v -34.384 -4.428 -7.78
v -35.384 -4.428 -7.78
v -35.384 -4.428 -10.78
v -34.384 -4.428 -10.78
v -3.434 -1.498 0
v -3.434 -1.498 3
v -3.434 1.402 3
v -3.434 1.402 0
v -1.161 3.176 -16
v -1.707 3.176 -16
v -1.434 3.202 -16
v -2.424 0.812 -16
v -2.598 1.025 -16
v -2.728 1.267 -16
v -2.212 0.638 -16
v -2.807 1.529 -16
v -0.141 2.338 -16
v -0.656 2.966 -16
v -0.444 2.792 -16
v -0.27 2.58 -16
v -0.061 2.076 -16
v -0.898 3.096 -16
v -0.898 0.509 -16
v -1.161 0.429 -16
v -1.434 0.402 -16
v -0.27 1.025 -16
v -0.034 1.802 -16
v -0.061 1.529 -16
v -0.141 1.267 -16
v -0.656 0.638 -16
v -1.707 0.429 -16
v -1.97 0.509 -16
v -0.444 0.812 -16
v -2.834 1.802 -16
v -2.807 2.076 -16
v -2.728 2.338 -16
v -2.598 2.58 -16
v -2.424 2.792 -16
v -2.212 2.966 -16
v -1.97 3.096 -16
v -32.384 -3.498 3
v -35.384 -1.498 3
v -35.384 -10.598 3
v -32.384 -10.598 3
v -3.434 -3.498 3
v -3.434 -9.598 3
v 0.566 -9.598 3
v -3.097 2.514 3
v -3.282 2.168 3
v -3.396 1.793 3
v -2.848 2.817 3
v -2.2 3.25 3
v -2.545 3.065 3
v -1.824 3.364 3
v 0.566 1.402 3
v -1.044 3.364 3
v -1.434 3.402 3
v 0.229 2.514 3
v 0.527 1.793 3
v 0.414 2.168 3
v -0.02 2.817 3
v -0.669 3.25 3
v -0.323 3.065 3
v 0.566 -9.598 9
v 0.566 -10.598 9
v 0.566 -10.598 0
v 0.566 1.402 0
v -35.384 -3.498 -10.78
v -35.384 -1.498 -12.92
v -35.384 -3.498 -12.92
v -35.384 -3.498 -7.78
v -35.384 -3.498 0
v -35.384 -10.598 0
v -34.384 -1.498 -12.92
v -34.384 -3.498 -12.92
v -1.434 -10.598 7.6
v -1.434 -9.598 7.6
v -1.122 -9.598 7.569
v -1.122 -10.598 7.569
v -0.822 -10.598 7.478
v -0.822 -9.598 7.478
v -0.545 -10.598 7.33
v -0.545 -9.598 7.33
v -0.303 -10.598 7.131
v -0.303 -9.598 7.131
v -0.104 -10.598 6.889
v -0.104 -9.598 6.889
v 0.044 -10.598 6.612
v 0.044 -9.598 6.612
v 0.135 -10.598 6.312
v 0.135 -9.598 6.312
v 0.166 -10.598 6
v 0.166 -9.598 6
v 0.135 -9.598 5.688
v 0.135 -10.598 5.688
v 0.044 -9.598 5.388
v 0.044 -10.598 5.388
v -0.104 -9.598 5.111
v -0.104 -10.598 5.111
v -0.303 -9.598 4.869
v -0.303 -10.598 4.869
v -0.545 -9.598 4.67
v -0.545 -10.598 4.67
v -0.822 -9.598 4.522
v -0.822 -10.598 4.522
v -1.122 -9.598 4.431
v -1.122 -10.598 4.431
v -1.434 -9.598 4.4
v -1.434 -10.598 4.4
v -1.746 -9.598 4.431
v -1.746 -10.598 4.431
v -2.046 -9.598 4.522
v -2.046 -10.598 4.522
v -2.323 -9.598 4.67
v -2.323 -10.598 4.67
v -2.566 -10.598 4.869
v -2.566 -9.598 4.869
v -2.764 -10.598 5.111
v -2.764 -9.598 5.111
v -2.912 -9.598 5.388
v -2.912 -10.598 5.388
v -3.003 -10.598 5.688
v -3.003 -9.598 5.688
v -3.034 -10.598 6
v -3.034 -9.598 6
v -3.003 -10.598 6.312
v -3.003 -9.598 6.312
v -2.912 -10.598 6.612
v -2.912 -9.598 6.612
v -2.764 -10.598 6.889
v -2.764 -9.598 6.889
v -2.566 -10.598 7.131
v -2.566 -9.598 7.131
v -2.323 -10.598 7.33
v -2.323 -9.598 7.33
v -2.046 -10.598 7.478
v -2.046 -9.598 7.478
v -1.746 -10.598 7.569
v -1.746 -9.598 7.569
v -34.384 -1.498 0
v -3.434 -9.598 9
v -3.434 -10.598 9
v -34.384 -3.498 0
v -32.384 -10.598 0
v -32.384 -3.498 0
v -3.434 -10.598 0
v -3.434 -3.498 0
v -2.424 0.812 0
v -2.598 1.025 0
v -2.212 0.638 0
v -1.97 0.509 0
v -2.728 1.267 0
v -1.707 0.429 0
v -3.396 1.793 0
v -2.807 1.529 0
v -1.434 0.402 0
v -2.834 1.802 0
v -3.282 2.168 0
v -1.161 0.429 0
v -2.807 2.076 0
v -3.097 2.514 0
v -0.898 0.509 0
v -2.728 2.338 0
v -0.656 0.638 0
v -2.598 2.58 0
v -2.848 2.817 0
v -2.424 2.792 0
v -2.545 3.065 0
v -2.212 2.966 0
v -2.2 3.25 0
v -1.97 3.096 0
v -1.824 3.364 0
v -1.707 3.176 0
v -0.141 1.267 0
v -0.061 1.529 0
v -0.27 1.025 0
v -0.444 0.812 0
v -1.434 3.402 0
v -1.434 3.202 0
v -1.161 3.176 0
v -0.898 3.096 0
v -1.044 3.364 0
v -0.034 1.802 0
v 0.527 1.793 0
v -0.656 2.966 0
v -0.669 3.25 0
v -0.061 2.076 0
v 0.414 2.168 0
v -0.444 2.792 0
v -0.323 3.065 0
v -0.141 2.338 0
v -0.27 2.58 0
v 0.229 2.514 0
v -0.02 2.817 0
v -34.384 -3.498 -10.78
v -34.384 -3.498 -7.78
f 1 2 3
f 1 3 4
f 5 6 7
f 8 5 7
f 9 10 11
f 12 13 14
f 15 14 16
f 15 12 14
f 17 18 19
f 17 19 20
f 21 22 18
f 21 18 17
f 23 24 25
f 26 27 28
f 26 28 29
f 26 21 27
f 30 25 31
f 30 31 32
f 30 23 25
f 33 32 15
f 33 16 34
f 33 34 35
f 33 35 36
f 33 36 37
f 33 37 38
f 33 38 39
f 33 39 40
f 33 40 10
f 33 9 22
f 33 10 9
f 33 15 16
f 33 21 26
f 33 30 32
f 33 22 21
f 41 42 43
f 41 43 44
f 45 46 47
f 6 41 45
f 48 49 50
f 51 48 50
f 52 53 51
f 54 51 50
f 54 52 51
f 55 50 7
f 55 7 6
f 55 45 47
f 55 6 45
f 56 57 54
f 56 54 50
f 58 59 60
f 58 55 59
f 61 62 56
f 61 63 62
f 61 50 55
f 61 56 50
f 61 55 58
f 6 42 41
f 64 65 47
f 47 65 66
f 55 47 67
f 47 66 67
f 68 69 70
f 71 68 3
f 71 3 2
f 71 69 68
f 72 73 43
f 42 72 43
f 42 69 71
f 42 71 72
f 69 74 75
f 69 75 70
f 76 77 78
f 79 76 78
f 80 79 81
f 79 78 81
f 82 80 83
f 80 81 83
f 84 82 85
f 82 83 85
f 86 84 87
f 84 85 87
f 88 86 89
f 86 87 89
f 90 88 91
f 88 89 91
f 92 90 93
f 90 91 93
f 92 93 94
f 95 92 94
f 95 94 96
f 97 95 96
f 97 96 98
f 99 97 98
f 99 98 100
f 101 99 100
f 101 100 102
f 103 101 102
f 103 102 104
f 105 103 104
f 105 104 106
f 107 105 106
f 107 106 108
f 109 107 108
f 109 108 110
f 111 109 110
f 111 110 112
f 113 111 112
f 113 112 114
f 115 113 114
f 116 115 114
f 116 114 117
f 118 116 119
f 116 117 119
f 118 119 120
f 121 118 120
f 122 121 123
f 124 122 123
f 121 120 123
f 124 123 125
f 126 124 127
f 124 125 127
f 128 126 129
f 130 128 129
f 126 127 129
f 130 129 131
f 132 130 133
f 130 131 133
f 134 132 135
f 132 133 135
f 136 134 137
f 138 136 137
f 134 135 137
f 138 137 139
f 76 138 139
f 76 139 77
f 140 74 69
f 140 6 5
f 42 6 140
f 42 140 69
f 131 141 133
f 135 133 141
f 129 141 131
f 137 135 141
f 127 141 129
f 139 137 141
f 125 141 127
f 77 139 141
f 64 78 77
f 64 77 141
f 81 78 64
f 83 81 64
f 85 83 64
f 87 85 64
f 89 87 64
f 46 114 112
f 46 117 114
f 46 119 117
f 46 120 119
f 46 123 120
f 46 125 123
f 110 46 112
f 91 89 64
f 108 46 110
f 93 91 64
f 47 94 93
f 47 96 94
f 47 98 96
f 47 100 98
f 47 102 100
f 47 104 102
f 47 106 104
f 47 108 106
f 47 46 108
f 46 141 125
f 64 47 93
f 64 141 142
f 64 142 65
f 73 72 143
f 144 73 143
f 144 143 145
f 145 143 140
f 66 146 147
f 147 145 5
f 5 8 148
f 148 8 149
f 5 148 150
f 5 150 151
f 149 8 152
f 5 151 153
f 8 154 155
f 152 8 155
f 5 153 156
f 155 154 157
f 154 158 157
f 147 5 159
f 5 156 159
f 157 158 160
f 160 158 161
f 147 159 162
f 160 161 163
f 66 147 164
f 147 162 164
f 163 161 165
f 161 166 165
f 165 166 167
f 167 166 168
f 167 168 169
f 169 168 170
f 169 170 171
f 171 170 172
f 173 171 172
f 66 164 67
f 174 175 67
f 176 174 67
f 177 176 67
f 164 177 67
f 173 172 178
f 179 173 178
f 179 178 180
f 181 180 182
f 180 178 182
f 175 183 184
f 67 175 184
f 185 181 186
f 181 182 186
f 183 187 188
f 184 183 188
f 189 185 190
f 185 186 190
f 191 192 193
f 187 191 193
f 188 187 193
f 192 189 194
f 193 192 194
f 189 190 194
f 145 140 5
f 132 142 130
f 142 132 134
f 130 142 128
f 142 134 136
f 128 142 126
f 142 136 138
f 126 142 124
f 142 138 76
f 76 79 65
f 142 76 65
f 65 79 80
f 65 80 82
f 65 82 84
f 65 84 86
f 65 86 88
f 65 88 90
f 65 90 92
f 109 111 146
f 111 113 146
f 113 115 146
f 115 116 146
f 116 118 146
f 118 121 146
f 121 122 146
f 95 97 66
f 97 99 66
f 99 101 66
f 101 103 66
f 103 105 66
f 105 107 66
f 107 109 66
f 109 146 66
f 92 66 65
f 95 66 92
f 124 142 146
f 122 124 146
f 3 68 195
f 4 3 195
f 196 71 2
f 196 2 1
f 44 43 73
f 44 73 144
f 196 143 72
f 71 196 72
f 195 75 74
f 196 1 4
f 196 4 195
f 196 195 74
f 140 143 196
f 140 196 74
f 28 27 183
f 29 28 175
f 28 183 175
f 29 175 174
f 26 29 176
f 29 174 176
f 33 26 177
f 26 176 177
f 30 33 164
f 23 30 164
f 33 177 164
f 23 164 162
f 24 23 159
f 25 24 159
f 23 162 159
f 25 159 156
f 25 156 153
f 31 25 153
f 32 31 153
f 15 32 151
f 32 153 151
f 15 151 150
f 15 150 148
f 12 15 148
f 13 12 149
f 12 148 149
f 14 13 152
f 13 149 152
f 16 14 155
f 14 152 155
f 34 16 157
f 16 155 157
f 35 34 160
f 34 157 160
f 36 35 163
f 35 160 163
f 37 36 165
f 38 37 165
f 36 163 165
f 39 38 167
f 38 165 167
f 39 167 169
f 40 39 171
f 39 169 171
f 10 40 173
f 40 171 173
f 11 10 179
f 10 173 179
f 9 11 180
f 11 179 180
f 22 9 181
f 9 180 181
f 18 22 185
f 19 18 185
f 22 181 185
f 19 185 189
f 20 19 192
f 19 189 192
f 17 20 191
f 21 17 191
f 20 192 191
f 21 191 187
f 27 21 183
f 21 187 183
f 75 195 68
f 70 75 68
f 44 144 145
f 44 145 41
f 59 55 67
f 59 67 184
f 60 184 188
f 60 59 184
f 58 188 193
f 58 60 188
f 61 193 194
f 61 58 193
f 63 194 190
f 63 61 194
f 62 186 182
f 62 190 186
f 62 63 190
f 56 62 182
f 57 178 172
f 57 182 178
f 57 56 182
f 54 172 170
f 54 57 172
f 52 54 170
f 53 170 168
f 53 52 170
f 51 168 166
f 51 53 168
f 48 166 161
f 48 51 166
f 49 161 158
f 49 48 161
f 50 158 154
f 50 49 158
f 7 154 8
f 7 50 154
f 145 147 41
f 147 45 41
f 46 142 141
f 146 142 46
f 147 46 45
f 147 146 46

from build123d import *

# Parameters (mm, degrees)
SKETCH1_W            = 4
SKETCH1_H            = 14
BOSS_EXTRUDE1_DEPTH  = 3
SKETCH2_R            = 1.4
BOSS_EXTRUDE2_DEPTH  = 16
FILLET1_RADIUS       = 2
FILLET1_LENGTH       = 3
SKETCH3_W            = 4
SKETCH3_H            = 1
BOSS_EXTRUDE4_DEPTH  = 6
SKETCH6_R            = 1.6
CUT_EXTRUDE2_DEPTH   = 6
SKETCH7_W            = 3
SKETCH7_H            = 2
BOSS_EXTRUDE5_DEPTH  = 30.95
SKETCH8_W            = 3
SKETCH8_H            = 2
BOSS_EXTRUDE6_DEPTH  = 1
SKETCH9_W            = 1
SKETCH9_H            = 2
BOSS_EXTRUDE7_DEPTH  = 3
SKETCH10_W           = 1
SKETCH10_H           = 2
BOSS_EXTRUDE8_DEPTH  = 5.92
SKETCH11_W           = 1
SKETCH11_H           = 2
BOSS_EXTRUDE9_DEPTH  = 4
SKETCH12_W           = 1
SKETCH12_H           = 3
BOSS_EXTRUDE14_DEPTH = 0.93
SKETCH13_W           = 3
SKETCH13_H           = 3
BOSS_EXTRUDE15_DEPTH = 7.1


with BuildPart() as part:
    # Sketch1 → Boss-Extrude1 (new body)
    with BuildSketch(Plane.XY):
        with Locations((-1.434146341, -3.597560976)):
            Rectangle(SKETCH1_W, SKETCH1_H)
    extrude(amount=BOSS_EXTRUDE1_DEPTH)

    # Sketch2 → Boss-Extrude2 (add)
    with BuildSketch(Plane(origin=(0, 0, 0), x_dir=(-1, 0, 0), z_dir=(0, 0, -1))):
        with Locations(Location((1.434146341, 1.802439024, 0), (0, 0, 180))):
            Circle(SKETCH2_R)
    extrude(amount=BOSS_EXTRUDE2_DEPTH)

    # Fillet1: full round fillet: the end face becomes a half cylinder, R = half its width
    fillet1_face = Plane((-1.434146341, 3.402439024, 1.5), x_dir=(0, 0, 1), z_dir=(0, 1, 0))  # on the end face: x along it, z out of the body
    fillet1_slab = fillet1_face.offset(-FILLET1_RADIUS / 2) * Box(FILLET1_LENGTH, 2 * FILLET1_RADIUS, FILLET1_RADIUS, mode=Mode.PRIVATE)  # the body's end, R deep
    fillet1_round = Plane((-1.434146341, 1.402439024, 1.5), x_dir=(0, 1, 0), z_dir=(0, 0, 1)) * Cylinder(FILLET1_RADIUS, FILLET1_LENGTH, mode=Mode.PRIVATE)  # its axis R under the face
    add(fillet1_slab - fillet1_round, mode=Mode.SUBTRACT)

    # Sketch3 → Boss-Extrude4 (add)
    with BuildSketch(Plane.XY.offset(3)):
        with Locations((-1.434146341, -10.097560976)):
            Rectangle(SKETCH3_W, SKETCH3_H)
    extrude(amount=BOSS_EXTRUDE4_DEPTH)

    # Sketch6 → Cut-Extrude2 (cut)
    with BuildSketch(Plane(origin=(0, -9.597560976, 0), x_dir=(1, 0, 0), z_dir=(0, 1, 0))):
        with Locations(Location((-1.434146341, -6, 0), (0, 0, 270))):
            Circle(SKETCH6_R)
    extrude(amount=-CUT_EXTRUDE2_DEPTH, mode=Mode.SUBTRACT)

    # Sketch7 → Boss-Extrude5 (add)
    with BuildSketch(Plane.ZY.offset(3.434146341)):
        with Locations((1.5, -2.497560976)):
            Rectangle(SKETCH7_W, SKETCH7_H)
    extrude(amount=BOSS_EXTRUDE5_DEPTH)

    # Sketch8 → Boss-Extrude6 (add)
    with BuildSketch(Plane.ZY.offset(34.384146341)):
        with Locations((1.5, -2.497560976)):
            Rectangle(SKETCH8_W, SKETCH8_H)
    extrude(amount=BOSS_EXTRUDE6_DEPTH)

    # Sketch9 → Boss-Extrude7 (add)
    with BuildSketch(Plane(origin=(0, 0, 0), x_dir=(-1, 0, 0), z_dir=(0, 0, -1))):
        with Locations((34.884146341, -2.497560976)):
            Rectangle(SKETCH9_W, SKETCH9_H)
    extrude(amount=BOSS_EXTRUDE7_DEPTH)

    # Sketch10 → Boss-Extrude8 (add)
    with BuildSketch(Plane(origin=(0, 0, -3), x_dir=(-1, 0, 0), z_dir=(0, 0, -1))):
        with Locations((34.884146341, -2.497560976)):
            Rectangle(SKETCH10_W, SKETCH10_H)
    extrude(amount=BOSS_EXTRUDE8_DEPTH)

    # Sketch11 → Boss-Extrude9 (add)
    with BuildSketch(Plane(origin=(0, 0, -8.92), x_dir=(-1, 0, 0), z_dir=(0, 0, -1))):
        with Locations((34.884146341, -2.497560976)):
            Rectangle(SKETCH11_W, SKETCH11_H)
    extrude(amount=BOSS_EXTRUDE9_DEPTH)

    # Sketch12 → Boss-Extrude14 (add)
    with BuildSketch(Plane.XZ.offset(3.497560976)):
        with Locations((-34.884146341, -9.28)):
            Rectangle(SKETCH12_W, SKETCH12_H)
    extrude(amount=BOSS_EXTRUDE14_DEPTH)

    # Sketch13 → Boss-Extrude15 (add)
    with BuildSketch(Plane.XZ.offset(3.497560976)):
        with Locations((-33.884146341, 1.5)):
            Rectangle(SKETCH13_W, SKETCH13_H)
    extrude(amount=BOSS_EXTRUDE15_DEPTH)


solid = part.part
